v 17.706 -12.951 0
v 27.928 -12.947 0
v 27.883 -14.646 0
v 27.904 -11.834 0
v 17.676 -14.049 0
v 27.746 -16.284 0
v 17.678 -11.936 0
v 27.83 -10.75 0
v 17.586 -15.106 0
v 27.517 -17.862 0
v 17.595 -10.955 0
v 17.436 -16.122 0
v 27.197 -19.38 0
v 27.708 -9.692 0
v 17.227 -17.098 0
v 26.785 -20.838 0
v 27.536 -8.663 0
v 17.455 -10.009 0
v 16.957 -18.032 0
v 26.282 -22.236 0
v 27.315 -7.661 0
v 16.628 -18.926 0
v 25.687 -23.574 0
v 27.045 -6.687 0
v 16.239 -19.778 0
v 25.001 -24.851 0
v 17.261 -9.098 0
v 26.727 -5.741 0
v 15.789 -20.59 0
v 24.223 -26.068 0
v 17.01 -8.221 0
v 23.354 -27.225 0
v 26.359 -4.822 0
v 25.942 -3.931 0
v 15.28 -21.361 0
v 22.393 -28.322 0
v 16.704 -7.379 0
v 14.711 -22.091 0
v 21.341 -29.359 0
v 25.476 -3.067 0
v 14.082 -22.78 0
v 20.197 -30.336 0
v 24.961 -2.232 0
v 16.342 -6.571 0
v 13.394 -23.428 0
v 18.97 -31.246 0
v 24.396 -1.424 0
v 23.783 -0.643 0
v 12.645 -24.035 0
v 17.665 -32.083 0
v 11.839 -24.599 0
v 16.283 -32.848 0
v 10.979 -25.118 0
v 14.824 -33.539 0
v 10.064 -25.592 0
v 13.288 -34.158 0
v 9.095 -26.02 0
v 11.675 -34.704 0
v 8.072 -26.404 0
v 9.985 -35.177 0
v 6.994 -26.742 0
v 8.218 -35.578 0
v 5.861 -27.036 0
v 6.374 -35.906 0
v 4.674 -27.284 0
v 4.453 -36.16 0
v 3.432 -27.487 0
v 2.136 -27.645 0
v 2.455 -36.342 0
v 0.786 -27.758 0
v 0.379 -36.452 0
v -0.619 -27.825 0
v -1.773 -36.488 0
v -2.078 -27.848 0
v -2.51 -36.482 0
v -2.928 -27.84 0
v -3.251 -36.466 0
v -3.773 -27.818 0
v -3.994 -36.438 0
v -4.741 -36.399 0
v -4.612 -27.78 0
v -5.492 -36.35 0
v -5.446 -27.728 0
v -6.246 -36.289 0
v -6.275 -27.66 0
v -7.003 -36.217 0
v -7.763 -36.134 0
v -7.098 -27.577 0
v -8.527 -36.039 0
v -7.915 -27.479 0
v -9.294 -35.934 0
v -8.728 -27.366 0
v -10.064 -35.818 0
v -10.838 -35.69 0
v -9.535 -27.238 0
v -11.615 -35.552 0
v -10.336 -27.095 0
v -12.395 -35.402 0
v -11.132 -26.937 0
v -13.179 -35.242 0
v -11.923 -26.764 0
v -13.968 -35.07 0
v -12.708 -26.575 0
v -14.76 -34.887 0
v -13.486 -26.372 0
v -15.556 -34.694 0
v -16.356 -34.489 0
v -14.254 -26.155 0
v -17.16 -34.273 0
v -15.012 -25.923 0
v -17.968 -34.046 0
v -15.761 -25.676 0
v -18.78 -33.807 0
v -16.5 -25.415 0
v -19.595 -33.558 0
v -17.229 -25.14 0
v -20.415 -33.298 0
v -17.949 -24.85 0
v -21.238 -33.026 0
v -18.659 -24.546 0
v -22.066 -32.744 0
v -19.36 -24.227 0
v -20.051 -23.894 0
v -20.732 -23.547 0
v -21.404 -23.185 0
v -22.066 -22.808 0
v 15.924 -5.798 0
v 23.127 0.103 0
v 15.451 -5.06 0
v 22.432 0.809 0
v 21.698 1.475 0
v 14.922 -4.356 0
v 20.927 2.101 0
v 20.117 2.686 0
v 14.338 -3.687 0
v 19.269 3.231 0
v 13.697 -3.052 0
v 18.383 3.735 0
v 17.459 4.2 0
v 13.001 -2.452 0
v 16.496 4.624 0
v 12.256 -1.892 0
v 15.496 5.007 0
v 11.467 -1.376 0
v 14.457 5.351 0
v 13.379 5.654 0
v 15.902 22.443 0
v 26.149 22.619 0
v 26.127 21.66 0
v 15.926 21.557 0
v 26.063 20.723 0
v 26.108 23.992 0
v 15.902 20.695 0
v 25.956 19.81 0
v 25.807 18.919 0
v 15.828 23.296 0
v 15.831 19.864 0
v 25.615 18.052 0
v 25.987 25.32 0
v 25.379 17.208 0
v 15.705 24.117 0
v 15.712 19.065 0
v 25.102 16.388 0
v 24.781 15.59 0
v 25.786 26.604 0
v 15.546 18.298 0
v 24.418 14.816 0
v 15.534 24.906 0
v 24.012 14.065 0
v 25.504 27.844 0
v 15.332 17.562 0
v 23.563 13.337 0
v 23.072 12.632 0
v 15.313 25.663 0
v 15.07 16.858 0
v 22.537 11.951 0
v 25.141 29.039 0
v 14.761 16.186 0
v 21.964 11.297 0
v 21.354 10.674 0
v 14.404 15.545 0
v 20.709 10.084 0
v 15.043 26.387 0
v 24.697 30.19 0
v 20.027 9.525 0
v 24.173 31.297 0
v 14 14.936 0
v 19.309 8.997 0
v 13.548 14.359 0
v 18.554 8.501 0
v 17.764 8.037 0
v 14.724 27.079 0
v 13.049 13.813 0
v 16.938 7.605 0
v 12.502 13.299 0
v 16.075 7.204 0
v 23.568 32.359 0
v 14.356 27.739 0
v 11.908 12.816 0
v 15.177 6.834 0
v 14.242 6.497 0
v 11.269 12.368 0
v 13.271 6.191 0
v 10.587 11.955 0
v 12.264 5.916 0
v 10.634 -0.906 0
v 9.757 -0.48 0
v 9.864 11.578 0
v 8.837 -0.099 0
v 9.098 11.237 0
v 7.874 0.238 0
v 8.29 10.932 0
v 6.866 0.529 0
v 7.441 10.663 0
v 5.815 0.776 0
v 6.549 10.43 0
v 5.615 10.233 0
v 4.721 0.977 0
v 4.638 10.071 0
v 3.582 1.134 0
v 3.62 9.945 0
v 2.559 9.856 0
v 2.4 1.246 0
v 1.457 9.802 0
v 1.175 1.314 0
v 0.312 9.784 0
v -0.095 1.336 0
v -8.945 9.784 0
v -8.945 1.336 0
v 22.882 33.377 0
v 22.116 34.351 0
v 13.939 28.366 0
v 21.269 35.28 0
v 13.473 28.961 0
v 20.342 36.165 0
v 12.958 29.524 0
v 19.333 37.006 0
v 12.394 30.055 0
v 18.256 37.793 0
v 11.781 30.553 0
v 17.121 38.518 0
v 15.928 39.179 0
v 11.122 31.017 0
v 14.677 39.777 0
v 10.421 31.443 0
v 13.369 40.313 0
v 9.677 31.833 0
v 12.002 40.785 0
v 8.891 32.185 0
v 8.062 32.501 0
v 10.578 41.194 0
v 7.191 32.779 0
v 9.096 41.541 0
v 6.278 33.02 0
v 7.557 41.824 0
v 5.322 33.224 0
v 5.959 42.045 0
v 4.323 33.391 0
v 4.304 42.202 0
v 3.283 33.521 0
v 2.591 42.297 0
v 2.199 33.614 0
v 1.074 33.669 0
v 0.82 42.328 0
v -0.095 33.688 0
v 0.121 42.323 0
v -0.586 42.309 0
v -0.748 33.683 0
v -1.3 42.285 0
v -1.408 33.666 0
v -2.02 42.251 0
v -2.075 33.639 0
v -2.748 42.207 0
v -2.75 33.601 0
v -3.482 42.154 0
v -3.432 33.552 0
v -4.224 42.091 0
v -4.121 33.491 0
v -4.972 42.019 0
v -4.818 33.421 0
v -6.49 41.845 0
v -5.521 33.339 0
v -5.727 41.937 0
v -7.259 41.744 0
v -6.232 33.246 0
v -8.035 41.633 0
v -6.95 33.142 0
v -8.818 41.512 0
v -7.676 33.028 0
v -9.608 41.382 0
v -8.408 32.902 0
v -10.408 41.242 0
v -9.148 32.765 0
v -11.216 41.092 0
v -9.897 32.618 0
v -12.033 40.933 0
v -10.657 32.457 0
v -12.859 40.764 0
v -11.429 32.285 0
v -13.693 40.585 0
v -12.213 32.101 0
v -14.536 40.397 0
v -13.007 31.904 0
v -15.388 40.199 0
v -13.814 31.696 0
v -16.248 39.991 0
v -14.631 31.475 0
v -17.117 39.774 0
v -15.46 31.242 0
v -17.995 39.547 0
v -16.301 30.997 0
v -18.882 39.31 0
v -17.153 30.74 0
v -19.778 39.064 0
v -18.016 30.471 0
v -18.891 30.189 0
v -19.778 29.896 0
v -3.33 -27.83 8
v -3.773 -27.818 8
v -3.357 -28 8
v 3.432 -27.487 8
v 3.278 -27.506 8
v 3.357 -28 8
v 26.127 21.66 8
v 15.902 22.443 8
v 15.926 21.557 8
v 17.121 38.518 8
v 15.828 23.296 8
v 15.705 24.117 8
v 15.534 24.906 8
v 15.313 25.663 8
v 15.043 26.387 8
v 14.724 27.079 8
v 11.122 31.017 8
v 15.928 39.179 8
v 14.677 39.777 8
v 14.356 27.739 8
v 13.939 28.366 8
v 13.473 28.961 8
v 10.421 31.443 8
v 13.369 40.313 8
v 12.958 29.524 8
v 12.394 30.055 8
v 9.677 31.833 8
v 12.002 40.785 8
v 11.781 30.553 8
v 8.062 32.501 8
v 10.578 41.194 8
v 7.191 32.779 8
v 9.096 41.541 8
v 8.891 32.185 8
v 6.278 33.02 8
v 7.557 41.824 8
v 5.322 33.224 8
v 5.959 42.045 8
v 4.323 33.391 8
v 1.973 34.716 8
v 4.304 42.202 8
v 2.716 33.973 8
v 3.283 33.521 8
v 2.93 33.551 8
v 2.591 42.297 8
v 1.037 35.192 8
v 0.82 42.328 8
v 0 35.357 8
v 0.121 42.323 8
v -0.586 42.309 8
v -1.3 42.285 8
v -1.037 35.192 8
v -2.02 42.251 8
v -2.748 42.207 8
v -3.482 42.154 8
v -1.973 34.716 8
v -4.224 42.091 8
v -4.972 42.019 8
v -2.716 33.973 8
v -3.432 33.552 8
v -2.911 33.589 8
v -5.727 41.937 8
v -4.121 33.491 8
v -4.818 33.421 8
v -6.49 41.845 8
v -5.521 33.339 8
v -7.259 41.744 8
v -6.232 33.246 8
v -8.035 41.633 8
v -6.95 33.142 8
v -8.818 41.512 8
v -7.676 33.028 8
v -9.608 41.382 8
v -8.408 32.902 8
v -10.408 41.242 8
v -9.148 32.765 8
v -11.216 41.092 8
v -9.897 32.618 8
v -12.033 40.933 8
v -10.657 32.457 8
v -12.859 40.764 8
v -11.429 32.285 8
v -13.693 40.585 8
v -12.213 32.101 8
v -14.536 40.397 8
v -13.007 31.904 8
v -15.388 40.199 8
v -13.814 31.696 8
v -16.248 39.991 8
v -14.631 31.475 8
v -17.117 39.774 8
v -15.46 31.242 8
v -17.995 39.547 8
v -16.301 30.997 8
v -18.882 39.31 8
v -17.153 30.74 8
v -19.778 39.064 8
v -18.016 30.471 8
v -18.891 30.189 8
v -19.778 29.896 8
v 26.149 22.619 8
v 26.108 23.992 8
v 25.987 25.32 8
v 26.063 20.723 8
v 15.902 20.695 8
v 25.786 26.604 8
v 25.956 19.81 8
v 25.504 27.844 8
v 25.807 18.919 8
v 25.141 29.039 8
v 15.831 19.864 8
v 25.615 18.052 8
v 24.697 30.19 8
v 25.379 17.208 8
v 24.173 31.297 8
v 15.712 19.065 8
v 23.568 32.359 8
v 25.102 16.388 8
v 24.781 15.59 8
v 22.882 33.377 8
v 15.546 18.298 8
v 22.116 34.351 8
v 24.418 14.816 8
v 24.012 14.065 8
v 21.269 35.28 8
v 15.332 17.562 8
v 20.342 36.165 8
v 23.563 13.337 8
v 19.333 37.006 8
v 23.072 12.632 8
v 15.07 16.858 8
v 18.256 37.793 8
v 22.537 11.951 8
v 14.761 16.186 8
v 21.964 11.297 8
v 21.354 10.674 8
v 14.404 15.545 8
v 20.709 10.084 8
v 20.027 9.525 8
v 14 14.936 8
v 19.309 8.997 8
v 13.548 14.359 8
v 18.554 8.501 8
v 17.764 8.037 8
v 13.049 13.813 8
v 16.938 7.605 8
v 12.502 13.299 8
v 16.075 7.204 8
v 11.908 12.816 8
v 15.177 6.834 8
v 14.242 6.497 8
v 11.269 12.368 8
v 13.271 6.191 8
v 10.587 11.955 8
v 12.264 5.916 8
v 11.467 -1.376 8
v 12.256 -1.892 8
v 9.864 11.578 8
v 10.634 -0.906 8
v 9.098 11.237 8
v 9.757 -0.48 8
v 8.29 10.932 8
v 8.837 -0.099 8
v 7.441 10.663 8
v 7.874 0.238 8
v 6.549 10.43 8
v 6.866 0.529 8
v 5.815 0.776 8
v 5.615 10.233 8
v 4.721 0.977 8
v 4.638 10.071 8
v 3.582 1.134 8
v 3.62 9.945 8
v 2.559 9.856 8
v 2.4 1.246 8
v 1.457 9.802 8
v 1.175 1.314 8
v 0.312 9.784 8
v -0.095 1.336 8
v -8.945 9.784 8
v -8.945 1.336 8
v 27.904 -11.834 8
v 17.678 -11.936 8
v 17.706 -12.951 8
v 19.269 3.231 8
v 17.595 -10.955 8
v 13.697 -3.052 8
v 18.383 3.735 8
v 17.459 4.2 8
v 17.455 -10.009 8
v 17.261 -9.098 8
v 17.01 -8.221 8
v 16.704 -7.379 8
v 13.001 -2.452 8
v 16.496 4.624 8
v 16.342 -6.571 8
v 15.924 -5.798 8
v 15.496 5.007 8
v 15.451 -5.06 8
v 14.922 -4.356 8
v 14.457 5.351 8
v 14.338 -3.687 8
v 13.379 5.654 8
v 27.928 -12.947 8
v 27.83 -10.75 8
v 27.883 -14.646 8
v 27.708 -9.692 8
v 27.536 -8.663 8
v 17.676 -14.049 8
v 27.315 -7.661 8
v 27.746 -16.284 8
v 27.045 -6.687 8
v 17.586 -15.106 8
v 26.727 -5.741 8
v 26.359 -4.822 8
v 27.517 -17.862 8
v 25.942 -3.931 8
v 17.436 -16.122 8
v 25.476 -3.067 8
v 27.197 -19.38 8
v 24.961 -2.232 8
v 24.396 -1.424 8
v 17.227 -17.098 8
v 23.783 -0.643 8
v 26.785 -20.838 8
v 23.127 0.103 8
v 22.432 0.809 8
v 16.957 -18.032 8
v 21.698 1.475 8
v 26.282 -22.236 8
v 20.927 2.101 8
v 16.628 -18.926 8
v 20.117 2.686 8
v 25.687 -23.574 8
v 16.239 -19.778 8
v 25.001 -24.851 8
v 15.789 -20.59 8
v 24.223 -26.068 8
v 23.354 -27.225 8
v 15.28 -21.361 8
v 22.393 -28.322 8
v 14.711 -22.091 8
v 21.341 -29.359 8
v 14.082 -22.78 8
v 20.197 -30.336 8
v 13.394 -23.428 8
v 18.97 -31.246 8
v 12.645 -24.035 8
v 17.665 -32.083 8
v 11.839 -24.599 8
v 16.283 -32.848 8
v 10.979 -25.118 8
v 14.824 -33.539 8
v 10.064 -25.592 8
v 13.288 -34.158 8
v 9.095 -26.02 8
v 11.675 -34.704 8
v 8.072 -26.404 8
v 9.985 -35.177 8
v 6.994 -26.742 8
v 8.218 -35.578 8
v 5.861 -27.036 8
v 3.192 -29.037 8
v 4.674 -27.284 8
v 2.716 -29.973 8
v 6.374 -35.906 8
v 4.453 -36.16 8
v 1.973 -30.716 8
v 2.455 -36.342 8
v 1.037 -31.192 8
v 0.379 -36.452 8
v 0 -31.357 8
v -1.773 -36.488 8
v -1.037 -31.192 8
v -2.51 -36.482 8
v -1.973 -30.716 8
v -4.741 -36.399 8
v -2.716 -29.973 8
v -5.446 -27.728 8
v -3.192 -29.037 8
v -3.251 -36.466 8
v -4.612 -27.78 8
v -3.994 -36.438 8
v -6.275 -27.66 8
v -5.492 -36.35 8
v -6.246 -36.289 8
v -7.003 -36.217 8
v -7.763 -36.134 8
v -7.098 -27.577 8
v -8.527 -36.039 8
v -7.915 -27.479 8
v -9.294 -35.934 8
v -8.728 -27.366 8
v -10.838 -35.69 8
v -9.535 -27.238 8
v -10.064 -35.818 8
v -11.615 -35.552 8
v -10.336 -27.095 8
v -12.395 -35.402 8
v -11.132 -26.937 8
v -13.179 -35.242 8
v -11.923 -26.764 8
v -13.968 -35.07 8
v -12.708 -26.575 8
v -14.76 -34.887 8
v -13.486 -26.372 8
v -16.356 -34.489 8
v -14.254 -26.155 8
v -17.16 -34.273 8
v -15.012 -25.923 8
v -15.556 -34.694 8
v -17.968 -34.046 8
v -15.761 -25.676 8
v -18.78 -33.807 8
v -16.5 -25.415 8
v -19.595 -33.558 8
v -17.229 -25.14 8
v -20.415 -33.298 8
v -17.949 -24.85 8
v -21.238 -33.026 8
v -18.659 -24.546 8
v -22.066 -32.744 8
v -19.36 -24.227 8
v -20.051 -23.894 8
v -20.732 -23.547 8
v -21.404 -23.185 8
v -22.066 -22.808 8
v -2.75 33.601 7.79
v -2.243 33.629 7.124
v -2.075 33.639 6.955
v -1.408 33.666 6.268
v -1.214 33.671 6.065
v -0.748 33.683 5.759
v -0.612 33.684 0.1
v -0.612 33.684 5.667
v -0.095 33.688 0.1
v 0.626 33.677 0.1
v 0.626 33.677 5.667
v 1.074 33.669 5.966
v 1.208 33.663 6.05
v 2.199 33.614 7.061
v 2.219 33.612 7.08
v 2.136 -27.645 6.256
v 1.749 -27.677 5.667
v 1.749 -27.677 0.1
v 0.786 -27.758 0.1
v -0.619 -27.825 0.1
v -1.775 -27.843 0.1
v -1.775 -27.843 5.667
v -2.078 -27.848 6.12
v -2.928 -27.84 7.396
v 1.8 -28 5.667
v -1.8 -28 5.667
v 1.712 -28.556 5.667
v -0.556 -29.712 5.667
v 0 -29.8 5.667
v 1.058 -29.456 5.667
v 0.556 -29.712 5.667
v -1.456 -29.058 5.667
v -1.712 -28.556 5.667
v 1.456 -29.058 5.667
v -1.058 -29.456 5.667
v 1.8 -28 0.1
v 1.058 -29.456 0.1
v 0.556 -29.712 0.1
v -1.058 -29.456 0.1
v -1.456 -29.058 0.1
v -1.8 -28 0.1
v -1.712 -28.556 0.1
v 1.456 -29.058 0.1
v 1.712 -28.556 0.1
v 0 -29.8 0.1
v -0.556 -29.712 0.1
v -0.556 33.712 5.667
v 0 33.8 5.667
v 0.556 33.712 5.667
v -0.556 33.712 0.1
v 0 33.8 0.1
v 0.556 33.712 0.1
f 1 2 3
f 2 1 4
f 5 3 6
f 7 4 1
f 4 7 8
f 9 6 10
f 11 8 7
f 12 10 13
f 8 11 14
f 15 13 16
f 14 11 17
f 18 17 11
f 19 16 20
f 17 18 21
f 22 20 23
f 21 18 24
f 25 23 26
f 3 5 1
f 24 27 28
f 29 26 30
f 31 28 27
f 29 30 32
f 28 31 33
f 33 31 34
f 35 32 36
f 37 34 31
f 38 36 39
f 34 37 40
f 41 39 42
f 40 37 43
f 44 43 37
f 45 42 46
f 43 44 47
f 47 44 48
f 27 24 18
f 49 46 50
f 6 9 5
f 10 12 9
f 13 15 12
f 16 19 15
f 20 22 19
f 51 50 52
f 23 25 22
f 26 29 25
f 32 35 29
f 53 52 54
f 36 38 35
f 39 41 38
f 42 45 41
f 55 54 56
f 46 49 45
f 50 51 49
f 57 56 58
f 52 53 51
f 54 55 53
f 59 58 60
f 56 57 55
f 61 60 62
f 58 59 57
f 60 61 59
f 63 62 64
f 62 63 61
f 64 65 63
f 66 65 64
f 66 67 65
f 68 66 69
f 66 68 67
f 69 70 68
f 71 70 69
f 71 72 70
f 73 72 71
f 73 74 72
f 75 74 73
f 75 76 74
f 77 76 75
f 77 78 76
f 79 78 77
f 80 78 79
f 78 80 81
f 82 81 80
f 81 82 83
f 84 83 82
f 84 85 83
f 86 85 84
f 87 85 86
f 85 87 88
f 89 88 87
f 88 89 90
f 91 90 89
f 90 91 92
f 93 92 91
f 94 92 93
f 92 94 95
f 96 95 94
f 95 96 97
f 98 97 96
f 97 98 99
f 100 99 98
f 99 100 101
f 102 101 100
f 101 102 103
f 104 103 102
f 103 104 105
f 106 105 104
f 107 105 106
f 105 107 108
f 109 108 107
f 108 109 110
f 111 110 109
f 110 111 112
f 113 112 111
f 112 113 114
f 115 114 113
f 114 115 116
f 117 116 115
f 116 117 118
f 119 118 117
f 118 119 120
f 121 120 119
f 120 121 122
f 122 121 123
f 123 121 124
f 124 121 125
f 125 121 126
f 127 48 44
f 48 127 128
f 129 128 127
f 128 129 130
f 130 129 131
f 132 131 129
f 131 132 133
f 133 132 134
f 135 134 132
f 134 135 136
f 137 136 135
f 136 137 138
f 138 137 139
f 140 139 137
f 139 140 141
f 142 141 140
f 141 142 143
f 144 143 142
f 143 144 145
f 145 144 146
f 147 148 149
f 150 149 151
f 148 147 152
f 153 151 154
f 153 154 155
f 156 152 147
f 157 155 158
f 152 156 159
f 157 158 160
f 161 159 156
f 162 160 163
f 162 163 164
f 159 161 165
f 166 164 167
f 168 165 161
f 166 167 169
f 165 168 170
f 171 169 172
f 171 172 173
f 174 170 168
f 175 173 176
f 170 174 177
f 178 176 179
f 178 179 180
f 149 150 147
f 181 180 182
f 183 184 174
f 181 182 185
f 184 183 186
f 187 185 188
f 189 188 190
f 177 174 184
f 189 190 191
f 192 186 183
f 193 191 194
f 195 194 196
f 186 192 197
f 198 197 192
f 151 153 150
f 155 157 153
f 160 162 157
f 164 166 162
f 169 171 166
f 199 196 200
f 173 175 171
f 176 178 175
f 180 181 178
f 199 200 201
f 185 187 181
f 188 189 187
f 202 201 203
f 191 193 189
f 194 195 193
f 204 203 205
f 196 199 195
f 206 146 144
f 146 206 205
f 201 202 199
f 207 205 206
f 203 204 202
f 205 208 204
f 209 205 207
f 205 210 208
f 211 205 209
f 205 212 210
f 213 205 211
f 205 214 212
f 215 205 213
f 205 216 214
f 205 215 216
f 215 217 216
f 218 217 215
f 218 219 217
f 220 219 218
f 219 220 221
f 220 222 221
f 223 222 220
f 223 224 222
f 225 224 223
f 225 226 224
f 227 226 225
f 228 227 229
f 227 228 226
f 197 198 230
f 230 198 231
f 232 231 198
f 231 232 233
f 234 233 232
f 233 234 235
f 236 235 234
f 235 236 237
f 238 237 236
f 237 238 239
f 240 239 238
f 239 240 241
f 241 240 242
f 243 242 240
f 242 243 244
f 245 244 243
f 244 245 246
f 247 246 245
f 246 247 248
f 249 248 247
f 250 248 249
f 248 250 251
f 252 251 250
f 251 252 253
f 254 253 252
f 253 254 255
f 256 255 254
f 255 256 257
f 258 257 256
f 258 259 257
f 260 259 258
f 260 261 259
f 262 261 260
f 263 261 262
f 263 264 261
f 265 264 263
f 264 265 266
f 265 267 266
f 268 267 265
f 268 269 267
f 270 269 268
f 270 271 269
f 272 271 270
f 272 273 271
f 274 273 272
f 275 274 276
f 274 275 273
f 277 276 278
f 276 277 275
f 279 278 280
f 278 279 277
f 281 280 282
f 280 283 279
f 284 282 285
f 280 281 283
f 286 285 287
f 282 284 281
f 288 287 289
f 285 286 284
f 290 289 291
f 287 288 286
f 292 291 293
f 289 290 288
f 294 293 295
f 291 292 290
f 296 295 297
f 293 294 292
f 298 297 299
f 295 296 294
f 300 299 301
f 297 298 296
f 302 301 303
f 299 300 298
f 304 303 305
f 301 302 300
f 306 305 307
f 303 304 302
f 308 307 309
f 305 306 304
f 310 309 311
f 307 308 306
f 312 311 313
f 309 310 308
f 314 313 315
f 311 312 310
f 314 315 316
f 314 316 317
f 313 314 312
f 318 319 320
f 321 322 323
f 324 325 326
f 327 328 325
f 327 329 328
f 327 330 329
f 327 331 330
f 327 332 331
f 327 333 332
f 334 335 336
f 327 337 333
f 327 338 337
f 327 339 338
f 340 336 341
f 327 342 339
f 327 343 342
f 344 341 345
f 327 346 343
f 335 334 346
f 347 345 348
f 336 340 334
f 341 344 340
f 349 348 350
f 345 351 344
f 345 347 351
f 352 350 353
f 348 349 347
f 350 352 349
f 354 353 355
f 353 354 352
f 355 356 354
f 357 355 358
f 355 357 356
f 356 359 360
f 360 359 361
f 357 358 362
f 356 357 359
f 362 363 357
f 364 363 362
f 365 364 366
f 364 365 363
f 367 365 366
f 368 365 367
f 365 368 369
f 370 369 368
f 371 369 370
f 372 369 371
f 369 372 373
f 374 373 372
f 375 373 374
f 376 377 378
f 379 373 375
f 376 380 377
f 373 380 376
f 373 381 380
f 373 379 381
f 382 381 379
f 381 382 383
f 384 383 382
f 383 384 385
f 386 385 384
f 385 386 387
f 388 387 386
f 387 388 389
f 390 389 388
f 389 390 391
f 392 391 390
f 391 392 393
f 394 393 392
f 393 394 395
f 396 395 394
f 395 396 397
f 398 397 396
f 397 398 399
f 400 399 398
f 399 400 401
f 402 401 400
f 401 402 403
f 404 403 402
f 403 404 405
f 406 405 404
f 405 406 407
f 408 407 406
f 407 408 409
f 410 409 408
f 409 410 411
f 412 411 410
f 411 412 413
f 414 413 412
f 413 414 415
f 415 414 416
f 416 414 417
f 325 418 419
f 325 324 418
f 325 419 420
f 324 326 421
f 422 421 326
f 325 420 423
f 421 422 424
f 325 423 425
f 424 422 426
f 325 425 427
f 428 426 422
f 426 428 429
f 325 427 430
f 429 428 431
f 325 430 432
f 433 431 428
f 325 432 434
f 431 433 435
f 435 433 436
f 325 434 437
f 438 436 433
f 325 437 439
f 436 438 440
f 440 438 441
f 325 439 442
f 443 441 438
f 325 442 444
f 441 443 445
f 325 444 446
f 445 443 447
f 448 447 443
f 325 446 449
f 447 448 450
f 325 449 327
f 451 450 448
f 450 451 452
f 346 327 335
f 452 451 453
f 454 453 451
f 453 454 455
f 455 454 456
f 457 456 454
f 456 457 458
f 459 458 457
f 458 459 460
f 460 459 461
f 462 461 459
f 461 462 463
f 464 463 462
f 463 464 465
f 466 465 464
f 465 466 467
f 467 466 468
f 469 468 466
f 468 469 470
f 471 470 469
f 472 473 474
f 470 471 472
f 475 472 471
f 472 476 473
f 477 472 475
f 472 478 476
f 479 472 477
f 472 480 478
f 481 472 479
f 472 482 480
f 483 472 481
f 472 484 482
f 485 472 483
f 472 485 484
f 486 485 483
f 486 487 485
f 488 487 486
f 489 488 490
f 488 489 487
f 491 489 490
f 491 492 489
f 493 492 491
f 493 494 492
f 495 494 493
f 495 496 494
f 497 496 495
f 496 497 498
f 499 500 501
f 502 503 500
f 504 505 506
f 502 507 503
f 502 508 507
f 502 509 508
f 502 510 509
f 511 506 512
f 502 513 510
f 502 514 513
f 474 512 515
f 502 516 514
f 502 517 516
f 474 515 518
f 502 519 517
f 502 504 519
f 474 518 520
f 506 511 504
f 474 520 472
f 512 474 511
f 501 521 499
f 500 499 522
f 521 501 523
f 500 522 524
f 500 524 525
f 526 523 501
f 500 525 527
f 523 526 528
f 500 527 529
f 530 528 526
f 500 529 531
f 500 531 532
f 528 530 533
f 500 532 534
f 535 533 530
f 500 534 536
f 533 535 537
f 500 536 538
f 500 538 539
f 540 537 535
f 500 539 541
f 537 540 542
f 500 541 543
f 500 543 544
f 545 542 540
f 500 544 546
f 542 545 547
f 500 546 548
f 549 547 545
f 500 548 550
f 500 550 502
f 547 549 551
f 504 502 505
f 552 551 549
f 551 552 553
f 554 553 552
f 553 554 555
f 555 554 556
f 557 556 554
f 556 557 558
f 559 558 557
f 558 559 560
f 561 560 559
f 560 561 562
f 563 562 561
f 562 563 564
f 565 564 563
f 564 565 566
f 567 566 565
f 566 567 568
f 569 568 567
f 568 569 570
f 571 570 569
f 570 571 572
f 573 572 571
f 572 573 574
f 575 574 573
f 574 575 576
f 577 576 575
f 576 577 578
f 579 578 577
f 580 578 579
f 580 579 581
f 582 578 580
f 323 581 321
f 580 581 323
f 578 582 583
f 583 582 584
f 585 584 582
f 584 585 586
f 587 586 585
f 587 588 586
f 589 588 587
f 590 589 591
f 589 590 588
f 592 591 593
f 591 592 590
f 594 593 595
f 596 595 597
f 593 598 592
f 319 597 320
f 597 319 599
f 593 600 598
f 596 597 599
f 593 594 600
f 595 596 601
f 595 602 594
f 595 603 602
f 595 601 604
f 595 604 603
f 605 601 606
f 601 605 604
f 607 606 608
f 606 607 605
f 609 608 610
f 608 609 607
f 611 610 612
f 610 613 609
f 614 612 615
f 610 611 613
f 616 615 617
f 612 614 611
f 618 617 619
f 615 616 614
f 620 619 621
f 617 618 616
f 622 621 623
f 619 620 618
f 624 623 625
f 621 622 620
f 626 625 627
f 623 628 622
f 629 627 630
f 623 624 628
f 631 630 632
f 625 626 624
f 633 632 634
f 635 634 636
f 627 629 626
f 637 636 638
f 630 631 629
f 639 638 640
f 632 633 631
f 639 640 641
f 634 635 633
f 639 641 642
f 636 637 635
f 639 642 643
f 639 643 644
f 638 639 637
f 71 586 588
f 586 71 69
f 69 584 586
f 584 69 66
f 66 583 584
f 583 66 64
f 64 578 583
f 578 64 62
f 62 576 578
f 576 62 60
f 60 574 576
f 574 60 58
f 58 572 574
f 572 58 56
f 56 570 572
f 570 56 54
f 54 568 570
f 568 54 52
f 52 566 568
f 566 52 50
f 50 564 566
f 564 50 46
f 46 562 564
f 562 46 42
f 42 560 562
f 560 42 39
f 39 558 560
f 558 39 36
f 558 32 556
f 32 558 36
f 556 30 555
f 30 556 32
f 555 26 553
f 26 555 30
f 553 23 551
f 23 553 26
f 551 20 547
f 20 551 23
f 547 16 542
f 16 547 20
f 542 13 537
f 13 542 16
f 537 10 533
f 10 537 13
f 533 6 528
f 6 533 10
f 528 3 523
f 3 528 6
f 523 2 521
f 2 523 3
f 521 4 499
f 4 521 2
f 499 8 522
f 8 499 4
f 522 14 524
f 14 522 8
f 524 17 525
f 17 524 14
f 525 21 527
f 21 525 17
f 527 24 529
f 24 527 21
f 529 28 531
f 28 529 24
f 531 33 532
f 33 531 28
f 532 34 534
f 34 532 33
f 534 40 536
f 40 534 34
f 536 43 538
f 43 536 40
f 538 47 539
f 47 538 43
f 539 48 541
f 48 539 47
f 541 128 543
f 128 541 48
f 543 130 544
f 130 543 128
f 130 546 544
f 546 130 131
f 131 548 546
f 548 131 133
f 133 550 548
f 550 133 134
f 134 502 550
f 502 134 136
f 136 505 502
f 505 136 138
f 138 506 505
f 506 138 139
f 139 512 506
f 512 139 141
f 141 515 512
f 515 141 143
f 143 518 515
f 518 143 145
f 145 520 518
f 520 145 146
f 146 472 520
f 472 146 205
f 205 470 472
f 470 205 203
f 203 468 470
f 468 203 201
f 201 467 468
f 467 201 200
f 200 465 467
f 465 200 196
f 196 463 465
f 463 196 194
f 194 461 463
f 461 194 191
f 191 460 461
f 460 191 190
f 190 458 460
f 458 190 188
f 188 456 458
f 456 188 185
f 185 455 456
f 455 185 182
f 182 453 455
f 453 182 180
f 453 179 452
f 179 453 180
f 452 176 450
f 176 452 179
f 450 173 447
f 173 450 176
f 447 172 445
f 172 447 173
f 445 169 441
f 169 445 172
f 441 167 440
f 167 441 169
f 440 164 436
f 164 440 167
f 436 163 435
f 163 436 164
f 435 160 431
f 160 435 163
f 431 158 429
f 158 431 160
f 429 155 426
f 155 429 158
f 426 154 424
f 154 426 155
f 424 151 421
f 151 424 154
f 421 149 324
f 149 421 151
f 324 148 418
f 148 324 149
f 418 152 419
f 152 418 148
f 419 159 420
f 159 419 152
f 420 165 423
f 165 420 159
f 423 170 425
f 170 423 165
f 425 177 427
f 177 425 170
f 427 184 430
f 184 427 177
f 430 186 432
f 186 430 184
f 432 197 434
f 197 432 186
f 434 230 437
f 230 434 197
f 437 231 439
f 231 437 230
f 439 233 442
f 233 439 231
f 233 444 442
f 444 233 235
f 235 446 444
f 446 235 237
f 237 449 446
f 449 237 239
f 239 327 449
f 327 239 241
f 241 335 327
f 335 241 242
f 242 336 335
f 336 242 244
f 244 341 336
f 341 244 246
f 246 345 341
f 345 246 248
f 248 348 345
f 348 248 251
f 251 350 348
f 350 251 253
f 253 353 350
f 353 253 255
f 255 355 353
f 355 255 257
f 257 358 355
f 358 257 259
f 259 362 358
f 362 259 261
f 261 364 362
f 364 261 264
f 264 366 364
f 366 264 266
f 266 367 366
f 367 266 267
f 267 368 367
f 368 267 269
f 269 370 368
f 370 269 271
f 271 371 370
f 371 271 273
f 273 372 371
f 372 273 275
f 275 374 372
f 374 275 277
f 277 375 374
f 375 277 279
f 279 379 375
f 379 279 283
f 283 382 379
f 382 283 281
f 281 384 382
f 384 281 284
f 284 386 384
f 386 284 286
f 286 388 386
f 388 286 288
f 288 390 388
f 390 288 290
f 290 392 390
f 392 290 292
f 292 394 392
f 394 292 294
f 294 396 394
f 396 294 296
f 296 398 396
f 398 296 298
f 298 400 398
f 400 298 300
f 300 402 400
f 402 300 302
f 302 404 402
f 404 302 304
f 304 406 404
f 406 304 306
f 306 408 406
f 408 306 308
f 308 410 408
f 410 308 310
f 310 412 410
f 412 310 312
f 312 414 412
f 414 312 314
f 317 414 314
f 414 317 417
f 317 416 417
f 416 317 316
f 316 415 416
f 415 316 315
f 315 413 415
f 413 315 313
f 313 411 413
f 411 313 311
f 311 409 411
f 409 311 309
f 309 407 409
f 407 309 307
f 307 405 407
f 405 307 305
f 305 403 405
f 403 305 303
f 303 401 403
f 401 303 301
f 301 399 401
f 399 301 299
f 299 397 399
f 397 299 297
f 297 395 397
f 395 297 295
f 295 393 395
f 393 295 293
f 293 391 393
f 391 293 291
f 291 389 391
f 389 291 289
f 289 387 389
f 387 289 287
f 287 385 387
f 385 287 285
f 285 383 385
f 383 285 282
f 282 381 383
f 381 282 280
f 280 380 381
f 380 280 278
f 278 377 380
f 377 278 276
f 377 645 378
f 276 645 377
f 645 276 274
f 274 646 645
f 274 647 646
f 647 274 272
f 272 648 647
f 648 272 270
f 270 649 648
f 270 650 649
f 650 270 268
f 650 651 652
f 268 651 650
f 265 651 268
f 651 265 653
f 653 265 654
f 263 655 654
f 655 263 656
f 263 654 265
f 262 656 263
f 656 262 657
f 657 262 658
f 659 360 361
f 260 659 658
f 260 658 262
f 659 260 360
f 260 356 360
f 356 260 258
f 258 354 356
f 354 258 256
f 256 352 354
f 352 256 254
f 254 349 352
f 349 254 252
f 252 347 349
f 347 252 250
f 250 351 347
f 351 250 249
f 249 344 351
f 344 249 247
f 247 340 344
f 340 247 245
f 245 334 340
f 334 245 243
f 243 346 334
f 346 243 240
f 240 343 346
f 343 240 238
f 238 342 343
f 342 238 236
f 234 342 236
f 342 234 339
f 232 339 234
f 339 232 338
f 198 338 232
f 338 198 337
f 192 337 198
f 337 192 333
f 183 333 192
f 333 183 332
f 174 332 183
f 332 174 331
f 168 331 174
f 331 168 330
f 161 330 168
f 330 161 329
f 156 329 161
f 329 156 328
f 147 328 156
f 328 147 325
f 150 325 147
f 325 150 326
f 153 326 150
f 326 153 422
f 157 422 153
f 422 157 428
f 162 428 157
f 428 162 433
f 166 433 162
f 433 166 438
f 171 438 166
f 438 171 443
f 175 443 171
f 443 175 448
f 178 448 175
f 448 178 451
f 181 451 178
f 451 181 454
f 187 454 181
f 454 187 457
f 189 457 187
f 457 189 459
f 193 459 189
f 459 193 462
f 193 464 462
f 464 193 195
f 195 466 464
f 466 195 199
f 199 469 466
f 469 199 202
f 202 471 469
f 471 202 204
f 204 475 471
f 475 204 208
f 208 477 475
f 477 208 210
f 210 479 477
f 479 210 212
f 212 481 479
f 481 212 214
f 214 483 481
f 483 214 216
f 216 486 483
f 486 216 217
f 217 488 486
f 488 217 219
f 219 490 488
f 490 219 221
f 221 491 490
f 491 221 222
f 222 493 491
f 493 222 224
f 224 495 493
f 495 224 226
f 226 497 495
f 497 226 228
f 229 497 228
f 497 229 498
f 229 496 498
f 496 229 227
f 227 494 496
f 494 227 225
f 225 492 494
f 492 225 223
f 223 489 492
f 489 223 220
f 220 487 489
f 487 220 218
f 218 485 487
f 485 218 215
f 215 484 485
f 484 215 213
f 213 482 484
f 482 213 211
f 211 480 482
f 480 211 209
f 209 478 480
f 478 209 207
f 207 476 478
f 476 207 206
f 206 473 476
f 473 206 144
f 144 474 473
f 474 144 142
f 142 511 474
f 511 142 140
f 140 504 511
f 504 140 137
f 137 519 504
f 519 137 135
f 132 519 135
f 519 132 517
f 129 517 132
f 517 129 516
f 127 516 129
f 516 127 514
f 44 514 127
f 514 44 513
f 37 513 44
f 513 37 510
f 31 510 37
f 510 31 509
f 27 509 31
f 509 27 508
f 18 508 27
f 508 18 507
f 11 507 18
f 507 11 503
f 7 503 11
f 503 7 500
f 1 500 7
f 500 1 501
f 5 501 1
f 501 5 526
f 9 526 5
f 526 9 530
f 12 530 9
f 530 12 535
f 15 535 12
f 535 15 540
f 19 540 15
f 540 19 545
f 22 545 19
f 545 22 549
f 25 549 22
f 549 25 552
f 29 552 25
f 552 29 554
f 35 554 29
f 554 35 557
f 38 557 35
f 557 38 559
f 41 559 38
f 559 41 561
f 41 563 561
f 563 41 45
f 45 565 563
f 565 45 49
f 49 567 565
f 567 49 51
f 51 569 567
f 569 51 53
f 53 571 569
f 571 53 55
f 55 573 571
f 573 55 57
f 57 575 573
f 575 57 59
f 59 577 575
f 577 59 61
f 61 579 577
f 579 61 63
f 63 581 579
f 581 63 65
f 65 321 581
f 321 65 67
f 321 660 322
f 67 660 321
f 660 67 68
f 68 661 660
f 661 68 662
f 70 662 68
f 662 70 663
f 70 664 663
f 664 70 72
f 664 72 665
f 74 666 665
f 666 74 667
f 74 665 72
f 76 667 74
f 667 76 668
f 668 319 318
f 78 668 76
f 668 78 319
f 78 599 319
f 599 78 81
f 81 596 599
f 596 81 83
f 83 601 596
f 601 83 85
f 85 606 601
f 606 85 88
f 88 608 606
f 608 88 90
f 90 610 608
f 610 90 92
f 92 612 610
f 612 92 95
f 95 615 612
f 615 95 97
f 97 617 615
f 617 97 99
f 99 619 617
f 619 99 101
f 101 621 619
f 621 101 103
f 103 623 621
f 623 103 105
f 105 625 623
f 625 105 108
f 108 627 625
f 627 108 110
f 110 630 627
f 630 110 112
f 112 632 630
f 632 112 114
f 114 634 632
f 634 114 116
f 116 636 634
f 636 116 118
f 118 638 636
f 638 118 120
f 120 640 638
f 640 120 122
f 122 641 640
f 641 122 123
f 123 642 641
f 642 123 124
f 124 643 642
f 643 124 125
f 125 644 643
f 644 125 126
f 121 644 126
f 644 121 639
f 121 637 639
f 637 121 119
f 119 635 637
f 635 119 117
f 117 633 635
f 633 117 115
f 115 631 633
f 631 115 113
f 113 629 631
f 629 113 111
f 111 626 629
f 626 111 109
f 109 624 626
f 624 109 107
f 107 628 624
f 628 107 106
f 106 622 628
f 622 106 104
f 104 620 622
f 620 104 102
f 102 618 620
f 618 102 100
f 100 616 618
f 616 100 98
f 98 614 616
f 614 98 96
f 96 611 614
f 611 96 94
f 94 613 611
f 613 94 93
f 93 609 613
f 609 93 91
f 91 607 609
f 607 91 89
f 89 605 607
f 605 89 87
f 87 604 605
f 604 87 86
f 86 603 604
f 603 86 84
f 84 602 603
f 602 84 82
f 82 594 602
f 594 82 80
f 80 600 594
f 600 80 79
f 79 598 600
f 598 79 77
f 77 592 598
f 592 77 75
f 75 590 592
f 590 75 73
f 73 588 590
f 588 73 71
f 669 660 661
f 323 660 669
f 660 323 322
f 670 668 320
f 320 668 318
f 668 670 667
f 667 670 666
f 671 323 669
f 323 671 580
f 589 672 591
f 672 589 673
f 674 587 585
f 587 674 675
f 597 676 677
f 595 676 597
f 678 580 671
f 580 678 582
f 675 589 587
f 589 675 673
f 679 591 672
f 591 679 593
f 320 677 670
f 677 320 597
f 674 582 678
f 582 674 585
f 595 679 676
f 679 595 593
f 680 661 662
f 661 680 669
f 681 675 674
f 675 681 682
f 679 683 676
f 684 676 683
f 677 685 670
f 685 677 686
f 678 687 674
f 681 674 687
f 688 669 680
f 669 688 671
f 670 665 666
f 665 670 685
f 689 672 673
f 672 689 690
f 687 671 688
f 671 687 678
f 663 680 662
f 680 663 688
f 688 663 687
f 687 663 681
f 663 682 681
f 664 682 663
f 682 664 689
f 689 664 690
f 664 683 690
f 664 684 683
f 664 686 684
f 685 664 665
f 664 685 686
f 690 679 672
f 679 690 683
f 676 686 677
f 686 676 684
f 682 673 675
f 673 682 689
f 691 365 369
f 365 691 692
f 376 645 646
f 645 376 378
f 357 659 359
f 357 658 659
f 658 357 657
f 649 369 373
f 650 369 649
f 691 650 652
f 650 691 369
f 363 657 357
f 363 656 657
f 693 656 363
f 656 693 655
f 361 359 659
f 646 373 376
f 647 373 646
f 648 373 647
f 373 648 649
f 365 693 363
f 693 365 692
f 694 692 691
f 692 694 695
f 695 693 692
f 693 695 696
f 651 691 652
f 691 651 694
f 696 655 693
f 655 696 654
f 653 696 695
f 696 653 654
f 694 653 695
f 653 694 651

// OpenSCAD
// Street Numbers for 3D printing
// Charles Tilford, 2019
// License: CC BY-NC-SA 4.0
//   https://creativecommons.org/licenses/by-nc-sa/4.0/

char="3";     // The number/letter to print

// Units are in mm, except for height of letter

// How many inches high should letter be?
inchesHigh=3;
// How thick/deep should letter be (mm)?
depth=8;

// Character coordinates just center the letter
charX=-30;    // Character X coord
charY=-35;    // Character Y coord
topScrew=32;  // Top screw Y coord
botScrew=-28; // Bottom screw Y coord
height=8;     // Thickness of character
// Screw dimensions. Default presumes
// #6 sheet metal screw
screwWid=3.6; // Width of screw shaft
screwTop=6.78;// Width of screw head
screwCon=5.08;// Height of head 'cone'

// Font to print in. Your system needs this
// installed, of course. If changed the hole
// positions almost certainly need to be
// changed, and maybe charX/charY.
fName="Open Sans Extrabold";
// https://fonts.google.com/specimen/Open+Sans
// Designer: Steve Matteson

// Thin floor below holes. My printer was
// struggling to have the hole 'border' stick
// to the stage. Just drill/screw thru it.
holeFloor=0.1; 

// ==========================================
// ===== All values below are auto-calculated
// ==========================================

// Scaled values
scaleFactor=inchesHigh / 3;
cX=charX * scaleFactor;
cY=charY * scaleFactor;
tS=topScrew * scaleFactor;
bS=botScrew * scaleFactor;
// Where do we start drawing screw head cone?
oS=depth - (screwCon-.05);

difference() {
  // We use difference() to punch out the screw holes
  // in the character
    
  // The character itself, 8mm thick
  translate([cX,cY,0])
    linear_extrude(height=depth, scale=1)
    text(char, size=(75*scaleFactor),
         $fn=100, font=fName);
    
  // Bottom screw hole
  translate([0,bS,oS]) color("red")
    cylinder(h=screwCon, d2=screwTop,
             d1=0, $fn=20);
   translate([0,bS,holeFloor])
    cylinder(h=20, d=screwWid, $fn=20);
    
  // Top screw hole
  translate([0,tS,oS]) color("red")
    cylinder(h=screwCon, d2=screwTop,
             d1=0, $fn=20);
  translate([0,tS,holeFloor])
    cylinder(h=20, d=screwWid, $fn=20);
}

// Colors are just to aid visualization of
// void spaces. $fn is "featuer number", ie how
// many polygons are devoted to object. The values
// above should be near your printing limit anyway.

// Developed in OpenSCAD
//    https://www.openscad.org/
